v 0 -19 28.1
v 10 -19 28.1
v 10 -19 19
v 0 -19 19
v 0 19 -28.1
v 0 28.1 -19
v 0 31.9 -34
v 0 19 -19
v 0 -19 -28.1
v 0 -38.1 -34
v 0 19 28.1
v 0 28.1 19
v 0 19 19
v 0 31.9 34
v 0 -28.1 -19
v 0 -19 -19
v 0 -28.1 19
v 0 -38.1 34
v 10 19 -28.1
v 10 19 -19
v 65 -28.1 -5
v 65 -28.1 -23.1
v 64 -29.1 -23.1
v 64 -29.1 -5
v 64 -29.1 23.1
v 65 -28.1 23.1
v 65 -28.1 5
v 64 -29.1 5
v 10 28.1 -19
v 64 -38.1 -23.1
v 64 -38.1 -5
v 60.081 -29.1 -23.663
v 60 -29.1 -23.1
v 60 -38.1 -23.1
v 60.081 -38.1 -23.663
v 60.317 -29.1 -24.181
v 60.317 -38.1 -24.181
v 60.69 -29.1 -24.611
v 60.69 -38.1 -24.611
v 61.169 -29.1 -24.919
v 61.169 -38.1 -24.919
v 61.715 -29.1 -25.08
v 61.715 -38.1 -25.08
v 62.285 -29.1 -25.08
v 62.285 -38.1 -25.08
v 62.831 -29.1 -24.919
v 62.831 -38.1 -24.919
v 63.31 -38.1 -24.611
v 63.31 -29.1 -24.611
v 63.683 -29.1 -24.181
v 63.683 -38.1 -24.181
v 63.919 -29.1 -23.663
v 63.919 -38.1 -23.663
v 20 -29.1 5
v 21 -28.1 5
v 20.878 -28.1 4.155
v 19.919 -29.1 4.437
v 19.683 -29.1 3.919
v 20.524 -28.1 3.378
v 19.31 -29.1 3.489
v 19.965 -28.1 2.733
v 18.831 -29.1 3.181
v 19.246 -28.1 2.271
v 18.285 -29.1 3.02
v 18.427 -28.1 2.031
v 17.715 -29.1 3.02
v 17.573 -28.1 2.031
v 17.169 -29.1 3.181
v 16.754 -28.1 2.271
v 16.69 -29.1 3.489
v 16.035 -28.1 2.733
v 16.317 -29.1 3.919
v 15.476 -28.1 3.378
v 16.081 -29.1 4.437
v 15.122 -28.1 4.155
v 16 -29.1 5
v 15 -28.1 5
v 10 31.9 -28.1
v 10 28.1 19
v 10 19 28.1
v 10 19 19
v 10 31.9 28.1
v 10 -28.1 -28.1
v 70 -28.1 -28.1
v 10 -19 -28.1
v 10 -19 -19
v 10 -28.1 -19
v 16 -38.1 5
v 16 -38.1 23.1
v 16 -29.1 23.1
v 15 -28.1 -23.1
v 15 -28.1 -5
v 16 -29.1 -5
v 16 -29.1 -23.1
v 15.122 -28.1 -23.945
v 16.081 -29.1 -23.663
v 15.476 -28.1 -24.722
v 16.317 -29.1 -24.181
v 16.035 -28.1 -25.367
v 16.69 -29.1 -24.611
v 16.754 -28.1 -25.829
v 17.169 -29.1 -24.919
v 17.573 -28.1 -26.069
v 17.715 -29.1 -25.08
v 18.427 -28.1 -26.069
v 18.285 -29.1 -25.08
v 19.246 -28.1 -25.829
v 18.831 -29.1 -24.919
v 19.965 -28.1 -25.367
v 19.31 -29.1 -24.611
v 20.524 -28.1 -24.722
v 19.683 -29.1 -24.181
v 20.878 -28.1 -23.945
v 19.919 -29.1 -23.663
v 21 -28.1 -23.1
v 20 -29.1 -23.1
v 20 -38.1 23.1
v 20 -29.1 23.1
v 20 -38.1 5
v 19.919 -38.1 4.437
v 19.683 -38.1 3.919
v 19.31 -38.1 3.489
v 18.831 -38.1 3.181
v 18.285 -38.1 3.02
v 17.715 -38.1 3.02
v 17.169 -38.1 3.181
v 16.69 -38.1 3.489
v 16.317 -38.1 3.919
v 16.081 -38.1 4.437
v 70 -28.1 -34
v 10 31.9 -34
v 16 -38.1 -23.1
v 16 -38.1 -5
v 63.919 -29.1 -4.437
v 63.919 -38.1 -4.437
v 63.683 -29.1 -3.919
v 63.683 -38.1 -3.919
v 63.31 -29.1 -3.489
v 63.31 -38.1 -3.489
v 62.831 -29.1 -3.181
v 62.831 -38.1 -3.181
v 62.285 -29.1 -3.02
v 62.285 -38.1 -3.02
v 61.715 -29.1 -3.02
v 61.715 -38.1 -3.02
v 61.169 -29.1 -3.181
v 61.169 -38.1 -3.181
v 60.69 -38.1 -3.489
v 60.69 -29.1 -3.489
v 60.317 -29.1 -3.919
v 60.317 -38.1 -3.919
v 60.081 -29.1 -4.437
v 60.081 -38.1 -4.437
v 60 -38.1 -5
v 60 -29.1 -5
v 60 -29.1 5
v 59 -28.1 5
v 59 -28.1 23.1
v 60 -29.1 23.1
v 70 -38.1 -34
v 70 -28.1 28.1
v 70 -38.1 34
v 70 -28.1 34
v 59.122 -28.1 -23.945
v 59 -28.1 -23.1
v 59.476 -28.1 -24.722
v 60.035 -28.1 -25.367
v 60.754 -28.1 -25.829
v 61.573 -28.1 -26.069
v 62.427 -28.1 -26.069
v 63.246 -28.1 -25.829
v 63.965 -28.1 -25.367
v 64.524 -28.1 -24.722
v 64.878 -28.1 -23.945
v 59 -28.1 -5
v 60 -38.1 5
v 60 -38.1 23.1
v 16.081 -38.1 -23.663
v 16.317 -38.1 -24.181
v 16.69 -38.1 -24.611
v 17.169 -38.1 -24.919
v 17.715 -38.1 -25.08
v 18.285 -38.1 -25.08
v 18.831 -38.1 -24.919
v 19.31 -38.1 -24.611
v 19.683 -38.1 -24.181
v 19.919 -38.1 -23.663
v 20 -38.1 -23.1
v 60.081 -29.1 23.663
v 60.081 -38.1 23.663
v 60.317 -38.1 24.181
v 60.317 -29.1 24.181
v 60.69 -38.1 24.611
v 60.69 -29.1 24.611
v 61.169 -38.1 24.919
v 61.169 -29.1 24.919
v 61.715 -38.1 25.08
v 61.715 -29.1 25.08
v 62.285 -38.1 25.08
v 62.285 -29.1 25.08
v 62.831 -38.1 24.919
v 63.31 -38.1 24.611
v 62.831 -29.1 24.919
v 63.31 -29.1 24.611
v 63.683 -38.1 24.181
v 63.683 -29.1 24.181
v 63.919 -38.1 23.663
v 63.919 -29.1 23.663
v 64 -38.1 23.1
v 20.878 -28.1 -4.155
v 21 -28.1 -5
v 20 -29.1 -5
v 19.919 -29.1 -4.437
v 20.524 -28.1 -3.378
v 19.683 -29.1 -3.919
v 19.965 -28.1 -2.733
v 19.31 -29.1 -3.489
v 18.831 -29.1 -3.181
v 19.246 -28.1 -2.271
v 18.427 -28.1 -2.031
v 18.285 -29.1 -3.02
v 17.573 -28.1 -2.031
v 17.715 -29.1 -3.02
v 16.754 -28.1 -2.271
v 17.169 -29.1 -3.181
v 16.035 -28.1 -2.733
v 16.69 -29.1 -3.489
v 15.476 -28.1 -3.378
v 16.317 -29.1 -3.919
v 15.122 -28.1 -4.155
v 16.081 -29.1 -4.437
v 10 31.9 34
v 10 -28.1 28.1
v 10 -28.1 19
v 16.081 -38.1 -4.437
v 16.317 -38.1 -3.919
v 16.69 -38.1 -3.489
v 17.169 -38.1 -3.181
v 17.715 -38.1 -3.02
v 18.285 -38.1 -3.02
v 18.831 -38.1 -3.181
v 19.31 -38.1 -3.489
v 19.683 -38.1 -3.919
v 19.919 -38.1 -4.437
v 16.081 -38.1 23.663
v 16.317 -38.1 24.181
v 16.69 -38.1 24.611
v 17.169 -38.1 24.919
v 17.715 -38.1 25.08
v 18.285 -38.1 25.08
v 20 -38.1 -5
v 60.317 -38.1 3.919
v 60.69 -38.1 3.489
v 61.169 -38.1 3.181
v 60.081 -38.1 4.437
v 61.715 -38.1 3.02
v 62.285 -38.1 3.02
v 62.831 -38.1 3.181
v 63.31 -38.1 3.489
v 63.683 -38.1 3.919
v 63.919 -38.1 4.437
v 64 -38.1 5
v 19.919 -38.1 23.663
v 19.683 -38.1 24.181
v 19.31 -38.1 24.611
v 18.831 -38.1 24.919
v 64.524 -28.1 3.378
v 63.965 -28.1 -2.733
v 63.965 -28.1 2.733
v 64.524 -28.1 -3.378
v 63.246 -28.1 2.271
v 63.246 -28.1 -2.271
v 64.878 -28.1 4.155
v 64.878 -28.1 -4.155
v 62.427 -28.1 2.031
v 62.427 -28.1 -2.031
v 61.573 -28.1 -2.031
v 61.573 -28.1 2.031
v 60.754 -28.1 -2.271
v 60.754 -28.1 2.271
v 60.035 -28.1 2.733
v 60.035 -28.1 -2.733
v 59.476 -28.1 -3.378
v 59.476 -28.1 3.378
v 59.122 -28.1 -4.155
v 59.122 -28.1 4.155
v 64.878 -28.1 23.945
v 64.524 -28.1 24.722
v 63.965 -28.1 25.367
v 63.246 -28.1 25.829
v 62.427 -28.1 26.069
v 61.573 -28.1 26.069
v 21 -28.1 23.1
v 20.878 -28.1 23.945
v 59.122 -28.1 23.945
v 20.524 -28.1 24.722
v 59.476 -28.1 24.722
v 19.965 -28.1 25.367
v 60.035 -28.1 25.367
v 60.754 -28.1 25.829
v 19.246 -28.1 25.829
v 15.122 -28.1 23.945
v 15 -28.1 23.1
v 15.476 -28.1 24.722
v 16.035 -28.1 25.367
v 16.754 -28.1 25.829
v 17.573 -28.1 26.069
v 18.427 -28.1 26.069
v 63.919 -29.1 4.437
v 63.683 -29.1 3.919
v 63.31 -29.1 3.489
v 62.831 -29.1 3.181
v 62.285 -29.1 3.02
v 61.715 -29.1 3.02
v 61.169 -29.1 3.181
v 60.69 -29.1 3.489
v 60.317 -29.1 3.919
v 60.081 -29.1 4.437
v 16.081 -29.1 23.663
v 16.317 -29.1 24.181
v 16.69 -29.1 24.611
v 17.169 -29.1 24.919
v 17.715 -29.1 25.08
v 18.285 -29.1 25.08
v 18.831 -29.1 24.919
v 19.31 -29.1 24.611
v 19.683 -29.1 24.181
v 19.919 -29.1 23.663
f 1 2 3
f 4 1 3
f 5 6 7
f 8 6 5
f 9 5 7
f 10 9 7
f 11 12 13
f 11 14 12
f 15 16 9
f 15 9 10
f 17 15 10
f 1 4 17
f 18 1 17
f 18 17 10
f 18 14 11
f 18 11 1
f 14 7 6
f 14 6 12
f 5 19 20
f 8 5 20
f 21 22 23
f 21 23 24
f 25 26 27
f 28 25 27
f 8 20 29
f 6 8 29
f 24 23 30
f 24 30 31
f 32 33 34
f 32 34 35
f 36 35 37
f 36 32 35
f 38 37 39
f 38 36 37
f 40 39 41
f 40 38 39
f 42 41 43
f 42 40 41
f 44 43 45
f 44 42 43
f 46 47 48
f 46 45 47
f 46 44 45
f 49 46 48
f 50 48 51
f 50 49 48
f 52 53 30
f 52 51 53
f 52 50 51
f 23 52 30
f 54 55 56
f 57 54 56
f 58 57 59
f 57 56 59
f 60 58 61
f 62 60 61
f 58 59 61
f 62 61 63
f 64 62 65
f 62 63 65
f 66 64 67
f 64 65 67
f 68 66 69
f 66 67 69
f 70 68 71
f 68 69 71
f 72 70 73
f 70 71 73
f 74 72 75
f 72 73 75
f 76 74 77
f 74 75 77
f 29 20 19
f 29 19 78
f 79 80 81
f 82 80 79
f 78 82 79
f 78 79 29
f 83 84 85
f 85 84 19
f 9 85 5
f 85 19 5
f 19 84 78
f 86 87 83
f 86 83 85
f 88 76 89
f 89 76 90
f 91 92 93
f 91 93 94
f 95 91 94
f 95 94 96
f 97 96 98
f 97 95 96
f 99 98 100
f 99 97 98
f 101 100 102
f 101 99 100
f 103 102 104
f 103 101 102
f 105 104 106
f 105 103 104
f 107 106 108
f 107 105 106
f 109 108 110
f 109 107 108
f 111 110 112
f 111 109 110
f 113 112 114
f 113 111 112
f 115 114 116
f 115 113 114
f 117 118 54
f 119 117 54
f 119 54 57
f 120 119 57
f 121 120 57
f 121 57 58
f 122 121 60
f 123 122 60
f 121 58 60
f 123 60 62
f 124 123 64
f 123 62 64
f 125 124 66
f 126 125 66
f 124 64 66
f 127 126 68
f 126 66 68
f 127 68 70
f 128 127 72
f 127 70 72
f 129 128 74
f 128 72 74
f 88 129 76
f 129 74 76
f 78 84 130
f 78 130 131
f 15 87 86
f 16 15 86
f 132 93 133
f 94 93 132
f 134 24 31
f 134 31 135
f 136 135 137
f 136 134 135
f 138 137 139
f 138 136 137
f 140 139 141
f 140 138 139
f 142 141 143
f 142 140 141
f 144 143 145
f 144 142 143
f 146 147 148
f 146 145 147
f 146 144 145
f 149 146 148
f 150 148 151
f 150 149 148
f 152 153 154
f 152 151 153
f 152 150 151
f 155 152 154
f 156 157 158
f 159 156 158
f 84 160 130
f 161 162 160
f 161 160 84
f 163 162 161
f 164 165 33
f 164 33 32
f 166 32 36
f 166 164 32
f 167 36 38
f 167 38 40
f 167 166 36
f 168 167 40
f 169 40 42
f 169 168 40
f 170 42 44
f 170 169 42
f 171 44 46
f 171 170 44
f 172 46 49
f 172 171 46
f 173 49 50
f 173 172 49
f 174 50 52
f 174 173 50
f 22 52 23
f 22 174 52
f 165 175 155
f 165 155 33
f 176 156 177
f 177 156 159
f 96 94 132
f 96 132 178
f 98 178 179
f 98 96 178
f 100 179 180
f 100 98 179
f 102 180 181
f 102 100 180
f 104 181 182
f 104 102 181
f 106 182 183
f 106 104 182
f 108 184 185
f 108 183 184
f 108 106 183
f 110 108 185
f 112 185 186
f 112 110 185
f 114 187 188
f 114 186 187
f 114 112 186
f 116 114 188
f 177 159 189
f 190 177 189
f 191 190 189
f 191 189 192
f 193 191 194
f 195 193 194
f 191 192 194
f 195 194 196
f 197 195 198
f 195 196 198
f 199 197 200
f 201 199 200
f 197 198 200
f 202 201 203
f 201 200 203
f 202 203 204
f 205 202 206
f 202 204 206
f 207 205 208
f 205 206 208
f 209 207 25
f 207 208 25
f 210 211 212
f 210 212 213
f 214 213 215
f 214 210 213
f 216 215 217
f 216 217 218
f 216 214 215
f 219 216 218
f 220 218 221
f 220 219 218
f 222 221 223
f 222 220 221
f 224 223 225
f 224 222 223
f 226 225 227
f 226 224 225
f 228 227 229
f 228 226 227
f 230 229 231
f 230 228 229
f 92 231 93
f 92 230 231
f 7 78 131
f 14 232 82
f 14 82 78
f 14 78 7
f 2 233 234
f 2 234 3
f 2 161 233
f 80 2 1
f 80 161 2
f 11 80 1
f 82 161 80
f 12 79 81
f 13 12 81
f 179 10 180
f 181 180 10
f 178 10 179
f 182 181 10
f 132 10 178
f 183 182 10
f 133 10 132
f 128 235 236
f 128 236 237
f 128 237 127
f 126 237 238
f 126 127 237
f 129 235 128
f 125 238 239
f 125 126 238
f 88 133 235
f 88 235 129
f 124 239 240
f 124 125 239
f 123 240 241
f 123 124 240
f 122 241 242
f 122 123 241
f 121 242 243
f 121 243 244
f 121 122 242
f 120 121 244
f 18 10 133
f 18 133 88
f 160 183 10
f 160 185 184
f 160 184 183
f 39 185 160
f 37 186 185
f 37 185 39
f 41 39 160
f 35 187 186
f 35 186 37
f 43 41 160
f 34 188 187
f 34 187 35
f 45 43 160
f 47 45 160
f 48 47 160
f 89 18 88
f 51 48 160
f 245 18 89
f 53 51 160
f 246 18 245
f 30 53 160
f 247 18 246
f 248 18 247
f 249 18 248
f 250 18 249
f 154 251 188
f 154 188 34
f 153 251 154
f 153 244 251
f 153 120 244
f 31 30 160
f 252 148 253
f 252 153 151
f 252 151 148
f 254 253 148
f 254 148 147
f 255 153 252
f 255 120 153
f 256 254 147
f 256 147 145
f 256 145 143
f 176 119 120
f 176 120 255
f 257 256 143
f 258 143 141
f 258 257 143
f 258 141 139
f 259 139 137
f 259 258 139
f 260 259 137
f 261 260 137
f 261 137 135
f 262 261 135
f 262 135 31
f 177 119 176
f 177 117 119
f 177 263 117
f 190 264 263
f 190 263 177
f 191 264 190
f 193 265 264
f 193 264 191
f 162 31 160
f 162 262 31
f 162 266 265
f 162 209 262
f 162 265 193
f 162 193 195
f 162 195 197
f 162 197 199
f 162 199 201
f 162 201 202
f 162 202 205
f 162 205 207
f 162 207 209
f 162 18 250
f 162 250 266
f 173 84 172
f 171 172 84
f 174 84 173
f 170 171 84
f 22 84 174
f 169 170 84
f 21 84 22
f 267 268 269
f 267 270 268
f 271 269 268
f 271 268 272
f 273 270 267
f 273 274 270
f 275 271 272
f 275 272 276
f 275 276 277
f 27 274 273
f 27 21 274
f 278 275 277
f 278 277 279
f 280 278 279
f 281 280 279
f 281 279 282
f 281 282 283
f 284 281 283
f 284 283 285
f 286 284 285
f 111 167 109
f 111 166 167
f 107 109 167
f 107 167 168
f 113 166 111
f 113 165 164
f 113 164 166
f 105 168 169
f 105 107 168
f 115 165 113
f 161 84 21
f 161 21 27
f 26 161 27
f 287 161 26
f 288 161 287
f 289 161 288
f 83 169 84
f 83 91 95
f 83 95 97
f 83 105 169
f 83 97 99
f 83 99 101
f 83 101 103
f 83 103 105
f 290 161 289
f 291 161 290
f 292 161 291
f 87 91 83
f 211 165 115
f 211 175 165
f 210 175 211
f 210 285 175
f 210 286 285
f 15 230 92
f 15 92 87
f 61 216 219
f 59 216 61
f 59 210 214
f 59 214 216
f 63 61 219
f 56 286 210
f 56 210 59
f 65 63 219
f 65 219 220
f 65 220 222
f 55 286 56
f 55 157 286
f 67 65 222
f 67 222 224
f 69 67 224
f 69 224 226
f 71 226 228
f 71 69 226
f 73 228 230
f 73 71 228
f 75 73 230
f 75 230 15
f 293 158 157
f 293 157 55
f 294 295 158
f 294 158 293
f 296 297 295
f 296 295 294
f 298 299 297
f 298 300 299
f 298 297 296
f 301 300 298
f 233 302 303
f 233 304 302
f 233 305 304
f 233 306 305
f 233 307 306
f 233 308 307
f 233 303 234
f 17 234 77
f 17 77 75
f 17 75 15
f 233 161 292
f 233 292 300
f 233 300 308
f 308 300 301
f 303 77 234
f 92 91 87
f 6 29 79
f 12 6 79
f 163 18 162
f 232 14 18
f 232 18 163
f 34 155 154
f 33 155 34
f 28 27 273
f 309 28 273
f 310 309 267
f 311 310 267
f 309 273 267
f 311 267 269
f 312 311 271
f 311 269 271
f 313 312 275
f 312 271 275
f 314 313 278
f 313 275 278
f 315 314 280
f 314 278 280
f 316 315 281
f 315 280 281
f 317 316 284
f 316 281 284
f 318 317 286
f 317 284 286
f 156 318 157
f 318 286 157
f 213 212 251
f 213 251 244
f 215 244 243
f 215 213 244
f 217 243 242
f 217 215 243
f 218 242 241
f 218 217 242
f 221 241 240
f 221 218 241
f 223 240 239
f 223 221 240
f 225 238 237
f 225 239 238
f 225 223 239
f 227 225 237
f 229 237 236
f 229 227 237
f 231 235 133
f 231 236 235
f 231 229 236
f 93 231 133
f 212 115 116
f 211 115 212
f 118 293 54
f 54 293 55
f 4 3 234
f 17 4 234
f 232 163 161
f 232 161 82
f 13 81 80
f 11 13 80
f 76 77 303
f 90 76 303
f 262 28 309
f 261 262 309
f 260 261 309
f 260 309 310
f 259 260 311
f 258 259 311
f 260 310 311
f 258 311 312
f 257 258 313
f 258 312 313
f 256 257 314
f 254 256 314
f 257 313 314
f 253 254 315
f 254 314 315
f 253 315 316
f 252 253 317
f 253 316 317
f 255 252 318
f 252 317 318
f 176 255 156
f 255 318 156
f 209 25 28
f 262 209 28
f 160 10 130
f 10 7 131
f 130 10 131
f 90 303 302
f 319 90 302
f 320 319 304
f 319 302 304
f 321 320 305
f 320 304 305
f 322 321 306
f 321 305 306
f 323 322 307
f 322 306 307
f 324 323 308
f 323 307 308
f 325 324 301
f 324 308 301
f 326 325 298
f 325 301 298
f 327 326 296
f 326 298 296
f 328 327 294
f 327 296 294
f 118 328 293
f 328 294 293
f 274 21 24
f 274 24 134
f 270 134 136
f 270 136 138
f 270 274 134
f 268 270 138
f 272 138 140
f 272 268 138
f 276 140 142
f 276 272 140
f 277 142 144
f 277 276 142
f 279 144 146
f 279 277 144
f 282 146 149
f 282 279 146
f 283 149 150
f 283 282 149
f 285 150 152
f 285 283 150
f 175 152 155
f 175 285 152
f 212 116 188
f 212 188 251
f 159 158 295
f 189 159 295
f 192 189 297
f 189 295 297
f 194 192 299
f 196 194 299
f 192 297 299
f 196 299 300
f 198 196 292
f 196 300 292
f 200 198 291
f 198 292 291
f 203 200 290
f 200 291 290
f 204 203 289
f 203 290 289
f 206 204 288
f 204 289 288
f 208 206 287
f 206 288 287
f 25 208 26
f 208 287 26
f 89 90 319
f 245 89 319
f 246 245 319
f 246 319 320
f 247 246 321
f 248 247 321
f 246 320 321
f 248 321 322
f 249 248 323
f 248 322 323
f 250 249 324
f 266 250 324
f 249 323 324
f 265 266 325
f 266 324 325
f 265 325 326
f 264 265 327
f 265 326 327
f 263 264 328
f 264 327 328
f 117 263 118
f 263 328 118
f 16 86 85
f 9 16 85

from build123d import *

# Parameters (mm, degrees)
BOSS_EXTRUDE1_DEPTH = 34
CUT_EXTRUDE1_DEPTH  = 28.1
CUT_EXTRUDE2_DEPTH  = 99.264947972
CHAMFER1_SIZE       = 1
CUT_EXTRUDE3_DEPTH  = 79.788387469


with BuildPart() as part:
    # Sketch2 → Boss-Extrude1 (new, symmetric)
    with BuildSketch(Plane.XY):
        Polygon((0, 31.9), (0, -38.1), (70, -38.1), (70, -28.1), (10, 31.9), align=None)
    extrude(amount=BOSS_EXTRUDE1_DEPTH, both=True)

    # Sketch4 → Cut-Extrude1 (cut, symmetric)
    with BuildSketch(Plane.XY):
        Polygon((10, 31.9), (70, -28.1), (10, -28.1), align=None)
    extrude(amount=CUT_EXTRUDE1_DEPTH, both=True, mode=Mode.SUBTRACT)

    # Sketch5 → Cut-Extrude2 (cut, through all)
    with BuildSketch(Plane(origin=(0, -28.1, 0), x_dir=(1, 0, 0), z_dir=(0, 1, 0))):
        with BuildLine():
            Line((20, 23.1), (20, 5))
            ThreePointArc((20, 5), (18, 3), (16, 5))
            Line((16, 5), (16, 23.1))
            ThreePointArc((16, 23.1), (18, 25.1), (20, 23.1))
        make_face()
        with BuildLine():
            Line((64, 23.1), (64, 5))
            ThreePointArc((64, 5), (62, 3), (60, 5))
            Line((60, 5), (60, 23.1))
            ThreePointArc((60, 23.1), (62, 25.1), (64, 23.1))
        make_face()
        with BuildLine():
            Line((64, -23.1), (64, -5))
            ThreePointArc((64, -5), (62, -3), (60, -5))
            Line((60, -5), (60, -23.1))
            ThreePointArc((60, -23.1), (62, -25.1), (64, -23.1))
        make_face()
        with BuildLine():
            Line((20, -23.1), (20, -5))
            ThreePointArc((20, -5), (18, -3), (16, -5))
            Line((16, -5), (16, -23.1))
            ThreePointArc((16, -23.1), (18, -25.1), (20, -23.1))
        make_face()
    extrude(amount=-CUT_EXTRUDE2_DEPTH, mode=Mode.SUBTRACT)

    # Chamfer1
    chamfer1_edges = [part.edges().sort_by_distance(p)[0] for p in [
        (18, -28.1, 25.1),
        (20, -28.1, 14.05),
        (18, -28.1, 3),
        (16, -28.1, 14.05),
        (62, -28.1, 25.1),
        (64, -28.1, 14.05),
        (62, -28.1, 3),
        (60, -28.1, 14.05),
        (62, -28.1, -25.1),
        (60, -28.1, -14.05),
        (62, -28.1, -3),
        (64, -28.1, -14.05),
        (18, -28.1, -25.1),
        (16, -28.1, -14.05),
        (18, -28.1, -3),
        (20, -28.1, -14.05),
    ]]
    chamfer(chamfer1_edges, length=CHAMFER1_SIZE)

    # Sketch6 → Cut-Extrude3 (cut, through all)
    with BuildSketch(Plane(origin=(10, 0, 0), x_dir=(0, 0, -1), z_dir=(1, 0, 0))):
        Polygon((-28.1, 19), (-28.1, -19), (-19, -19), (-19, -28.1), (19, -28.1), (19, -19), (28.1, -19), (28.1, 19), (19, 19), (19, 28.1), (-19, 28.1), (-19, 19), align=None)
    extrude(amount=-CUT_EXTRUDE3_DEPTH, mode=Mode.SUBTRACT)


solid = part.part
